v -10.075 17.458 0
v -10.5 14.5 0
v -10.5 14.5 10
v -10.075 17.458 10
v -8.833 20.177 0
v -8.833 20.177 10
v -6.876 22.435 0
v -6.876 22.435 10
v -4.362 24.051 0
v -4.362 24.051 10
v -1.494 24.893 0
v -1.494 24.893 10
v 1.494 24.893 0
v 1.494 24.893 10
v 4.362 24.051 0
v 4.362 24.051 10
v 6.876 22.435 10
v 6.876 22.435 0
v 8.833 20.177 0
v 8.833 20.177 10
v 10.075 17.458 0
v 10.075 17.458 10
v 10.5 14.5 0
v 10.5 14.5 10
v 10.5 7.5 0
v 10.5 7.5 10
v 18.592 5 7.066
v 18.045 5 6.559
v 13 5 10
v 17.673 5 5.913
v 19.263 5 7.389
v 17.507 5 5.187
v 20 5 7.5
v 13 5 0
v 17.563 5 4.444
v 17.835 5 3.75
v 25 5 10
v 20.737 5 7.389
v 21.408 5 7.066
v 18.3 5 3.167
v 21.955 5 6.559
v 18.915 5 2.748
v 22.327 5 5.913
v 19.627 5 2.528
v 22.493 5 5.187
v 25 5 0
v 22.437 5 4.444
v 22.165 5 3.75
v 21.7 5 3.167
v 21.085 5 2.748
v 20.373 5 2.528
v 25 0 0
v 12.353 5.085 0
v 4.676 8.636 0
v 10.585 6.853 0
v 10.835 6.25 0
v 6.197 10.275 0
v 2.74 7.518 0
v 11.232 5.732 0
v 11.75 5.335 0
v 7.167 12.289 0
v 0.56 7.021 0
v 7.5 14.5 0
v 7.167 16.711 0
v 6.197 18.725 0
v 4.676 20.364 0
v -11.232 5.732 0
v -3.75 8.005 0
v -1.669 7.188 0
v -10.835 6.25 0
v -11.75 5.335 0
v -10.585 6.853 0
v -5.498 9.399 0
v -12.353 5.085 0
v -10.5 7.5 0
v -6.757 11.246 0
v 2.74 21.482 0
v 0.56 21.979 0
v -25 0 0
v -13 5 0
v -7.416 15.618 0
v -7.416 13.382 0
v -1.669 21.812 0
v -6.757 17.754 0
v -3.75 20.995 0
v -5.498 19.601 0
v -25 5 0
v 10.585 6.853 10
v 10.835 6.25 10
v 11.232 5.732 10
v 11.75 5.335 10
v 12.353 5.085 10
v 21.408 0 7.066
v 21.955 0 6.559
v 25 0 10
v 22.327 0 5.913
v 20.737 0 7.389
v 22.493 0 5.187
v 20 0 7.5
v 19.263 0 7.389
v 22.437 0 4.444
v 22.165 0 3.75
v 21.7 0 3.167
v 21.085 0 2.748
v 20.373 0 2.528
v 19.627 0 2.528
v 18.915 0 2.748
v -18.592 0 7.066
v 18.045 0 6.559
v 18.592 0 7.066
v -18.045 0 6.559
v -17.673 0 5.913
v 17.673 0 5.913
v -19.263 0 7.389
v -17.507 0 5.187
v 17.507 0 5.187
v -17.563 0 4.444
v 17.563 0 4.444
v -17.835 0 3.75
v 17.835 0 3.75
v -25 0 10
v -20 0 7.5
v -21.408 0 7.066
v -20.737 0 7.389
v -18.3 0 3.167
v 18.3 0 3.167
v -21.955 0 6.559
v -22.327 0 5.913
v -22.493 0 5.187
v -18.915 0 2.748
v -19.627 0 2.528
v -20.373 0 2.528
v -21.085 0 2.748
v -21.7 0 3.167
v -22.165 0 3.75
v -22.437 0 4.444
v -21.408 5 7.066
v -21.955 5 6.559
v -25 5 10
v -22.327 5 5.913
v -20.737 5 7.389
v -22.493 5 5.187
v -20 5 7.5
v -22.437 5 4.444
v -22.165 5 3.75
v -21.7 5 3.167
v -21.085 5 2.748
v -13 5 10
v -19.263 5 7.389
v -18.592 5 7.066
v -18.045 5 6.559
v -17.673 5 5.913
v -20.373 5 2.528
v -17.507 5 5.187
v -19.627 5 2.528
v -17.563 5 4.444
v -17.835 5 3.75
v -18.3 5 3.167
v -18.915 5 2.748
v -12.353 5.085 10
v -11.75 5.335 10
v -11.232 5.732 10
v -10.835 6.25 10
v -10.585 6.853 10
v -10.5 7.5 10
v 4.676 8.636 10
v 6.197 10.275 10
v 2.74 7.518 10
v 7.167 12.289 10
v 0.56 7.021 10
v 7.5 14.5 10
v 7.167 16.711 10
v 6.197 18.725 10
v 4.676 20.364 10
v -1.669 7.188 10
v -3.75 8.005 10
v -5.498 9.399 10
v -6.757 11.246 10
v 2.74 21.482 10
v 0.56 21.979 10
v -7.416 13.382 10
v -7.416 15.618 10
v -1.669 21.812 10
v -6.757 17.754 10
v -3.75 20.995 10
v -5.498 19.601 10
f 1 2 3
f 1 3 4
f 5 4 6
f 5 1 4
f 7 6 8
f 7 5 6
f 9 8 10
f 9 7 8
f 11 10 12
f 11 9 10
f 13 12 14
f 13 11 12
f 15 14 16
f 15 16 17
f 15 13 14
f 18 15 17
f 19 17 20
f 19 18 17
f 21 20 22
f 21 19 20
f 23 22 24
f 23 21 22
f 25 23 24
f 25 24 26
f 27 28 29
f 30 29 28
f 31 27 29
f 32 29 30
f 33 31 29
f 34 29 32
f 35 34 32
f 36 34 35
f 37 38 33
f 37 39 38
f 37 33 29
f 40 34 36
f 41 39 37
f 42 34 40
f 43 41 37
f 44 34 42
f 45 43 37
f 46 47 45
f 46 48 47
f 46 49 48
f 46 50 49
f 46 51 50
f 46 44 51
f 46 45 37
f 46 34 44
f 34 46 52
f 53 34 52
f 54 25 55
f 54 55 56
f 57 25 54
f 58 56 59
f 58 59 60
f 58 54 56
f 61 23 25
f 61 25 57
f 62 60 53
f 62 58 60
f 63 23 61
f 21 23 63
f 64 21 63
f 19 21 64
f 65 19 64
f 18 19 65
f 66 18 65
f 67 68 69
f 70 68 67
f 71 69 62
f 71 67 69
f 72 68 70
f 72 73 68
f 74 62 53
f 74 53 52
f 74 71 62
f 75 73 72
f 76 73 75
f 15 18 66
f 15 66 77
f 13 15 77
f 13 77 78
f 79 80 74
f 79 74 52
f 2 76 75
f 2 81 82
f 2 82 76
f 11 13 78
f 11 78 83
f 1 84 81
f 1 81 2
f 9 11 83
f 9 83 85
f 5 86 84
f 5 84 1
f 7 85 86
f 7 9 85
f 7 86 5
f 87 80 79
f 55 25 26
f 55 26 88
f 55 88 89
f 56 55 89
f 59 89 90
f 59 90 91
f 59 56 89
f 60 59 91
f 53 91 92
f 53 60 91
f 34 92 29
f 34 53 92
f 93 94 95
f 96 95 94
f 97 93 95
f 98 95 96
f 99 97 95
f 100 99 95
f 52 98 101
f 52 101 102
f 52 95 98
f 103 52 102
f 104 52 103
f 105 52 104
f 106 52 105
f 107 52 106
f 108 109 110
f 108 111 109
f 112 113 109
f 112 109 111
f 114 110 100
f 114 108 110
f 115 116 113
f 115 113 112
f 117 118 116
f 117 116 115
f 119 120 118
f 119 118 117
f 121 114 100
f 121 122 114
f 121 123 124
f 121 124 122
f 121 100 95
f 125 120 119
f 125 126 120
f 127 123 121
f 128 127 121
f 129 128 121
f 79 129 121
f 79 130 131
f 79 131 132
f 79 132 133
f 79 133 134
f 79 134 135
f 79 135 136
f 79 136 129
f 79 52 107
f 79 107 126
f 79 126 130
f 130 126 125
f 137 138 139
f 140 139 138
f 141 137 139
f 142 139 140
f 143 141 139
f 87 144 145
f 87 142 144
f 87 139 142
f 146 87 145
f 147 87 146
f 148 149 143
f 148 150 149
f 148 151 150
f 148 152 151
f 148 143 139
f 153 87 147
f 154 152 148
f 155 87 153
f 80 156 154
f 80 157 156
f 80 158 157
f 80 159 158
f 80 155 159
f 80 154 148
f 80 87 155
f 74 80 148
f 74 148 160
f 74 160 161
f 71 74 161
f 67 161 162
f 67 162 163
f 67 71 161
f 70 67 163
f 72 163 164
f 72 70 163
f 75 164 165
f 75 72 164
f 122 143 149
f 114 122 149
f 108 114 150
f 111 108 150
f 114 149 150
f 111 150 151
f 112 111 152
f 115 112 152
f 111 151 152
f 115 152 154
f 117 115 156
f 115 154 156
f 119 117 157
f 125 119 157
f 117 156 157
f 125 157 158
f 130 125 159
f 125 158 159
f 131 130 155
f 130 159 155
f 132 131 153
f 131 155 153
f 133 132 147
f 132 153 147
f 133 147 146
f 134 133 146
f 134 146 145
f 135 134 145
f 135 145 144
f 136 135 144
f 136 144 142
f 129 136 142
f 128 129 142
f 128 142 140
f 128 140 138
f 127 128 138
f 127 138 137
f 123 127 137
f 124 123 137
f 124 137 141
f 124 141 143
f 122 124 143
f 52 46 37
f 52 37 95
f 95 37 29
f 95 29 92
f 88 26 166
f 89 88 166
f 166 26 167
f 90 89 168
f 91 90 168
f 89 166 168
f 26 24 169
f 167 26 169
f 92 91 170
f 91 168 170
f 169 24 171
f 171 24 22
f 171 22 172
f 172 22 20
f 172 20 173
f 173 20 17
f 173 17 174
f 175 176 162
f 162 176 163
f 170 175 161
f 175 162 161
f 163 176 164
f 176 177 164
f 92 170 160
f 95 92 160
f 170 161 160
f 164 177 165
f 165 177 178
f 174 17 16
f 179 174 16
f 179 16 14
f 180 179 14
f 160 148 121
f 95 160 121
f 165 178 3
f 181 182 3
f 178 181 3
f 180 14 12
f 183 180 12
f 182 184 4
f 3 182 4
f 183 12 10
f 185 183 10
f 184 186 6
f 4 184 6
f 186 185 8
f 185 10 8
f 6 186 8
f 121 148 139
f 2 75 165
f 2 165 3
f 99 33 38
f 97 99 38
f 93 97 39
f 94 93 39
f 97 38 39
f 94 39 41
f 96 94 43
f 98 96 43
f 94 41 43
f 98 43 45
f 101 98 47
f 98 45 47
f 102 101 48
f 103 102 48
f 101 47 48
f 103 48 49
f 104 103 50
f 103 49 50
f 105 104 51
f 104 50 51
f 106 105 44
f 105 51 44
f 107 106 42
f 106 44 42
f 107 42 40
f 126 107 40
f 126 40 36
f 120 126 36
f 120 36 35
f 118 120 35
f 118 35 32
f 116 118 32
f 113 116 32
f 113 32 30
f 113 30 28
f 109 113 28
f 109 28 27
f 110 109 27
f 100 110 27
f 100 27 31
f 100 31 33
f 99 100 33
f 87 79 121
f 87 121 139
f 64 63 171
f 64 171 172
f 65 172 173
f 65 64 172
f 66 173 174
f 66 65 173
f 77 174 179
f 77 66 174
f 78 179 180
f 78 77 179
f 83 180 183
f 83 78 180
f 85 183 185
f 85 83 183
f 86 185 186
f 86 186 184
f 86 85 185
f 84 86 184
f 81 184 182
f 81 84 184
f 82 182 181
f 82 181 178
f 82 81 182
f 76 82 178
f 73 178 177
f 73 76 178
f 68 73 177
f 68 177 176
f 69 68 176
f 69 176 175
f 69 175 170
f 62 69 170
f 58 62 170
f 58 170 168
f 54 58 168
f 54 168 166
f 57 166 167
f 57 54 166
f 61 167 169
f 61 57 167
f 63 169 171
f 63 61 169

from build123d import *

# Parameters (mm, degrees)
SKETCH1_R           = 7.5
BOSS_EXTRUDE1_DEPTH = 10
SKETCH3_R           = 2.5
CUT_EXTRUDE1_DEPTH  = 22


with BuildPart() as part:
    # Sketch1 → Boss-Extrude1 (new body)
    with BuildSketch(Plane.XY):
        with BuildLine():
            Line((25, 0), (-25, 0))
            Line((-25, 0), (-25, 5))
            Line((-25, 5), (-13, 5))
            ThreePointArc((-13, 5), (-11.232233047, 5.732233047), (-10.5, 7.5))
            Line((-10.5, 7.5), (-10.5, 14.5))
            ThreePointArc((-10.5, 14.5), (0, 25), (10.5, 14.5))
            Line((10.5, 14.5), (10.5, 7.5))
            ThreePointArc((10.5, 7.5), (11.232233047, 5.732233047), (13, 5))
            Line((13, 5), (25, 5))
            Line((25, 5), (25, 0))
        make_face()
        with Locations((0, 14.5)):
            Circle(SKETCH1_R, mode=Mode.SUBTRACT)
    extrude(amount=BOSS_EXTRUDE1_DEPTH)

    # Sketch3 → Cut-Extrude1 (cut)
    with BuildSketch(Plane(origin=(0, 5, 0), x_dir=(1, 0, 0), z_dir=(0, 1, 0))):
        with Locations(Location((-20, -5, 0), (0, 0, 270))):
            Circle(SKETCH3_R)
        with Locations(Location((20, -5, 0), (0, 0, 270))):
            Circle(SKETCH3_R)
    extrude(amount=-CUT_EXTRUDE1_DEPTH, mode=Mode.SUBTRACT)


solid = part.part
